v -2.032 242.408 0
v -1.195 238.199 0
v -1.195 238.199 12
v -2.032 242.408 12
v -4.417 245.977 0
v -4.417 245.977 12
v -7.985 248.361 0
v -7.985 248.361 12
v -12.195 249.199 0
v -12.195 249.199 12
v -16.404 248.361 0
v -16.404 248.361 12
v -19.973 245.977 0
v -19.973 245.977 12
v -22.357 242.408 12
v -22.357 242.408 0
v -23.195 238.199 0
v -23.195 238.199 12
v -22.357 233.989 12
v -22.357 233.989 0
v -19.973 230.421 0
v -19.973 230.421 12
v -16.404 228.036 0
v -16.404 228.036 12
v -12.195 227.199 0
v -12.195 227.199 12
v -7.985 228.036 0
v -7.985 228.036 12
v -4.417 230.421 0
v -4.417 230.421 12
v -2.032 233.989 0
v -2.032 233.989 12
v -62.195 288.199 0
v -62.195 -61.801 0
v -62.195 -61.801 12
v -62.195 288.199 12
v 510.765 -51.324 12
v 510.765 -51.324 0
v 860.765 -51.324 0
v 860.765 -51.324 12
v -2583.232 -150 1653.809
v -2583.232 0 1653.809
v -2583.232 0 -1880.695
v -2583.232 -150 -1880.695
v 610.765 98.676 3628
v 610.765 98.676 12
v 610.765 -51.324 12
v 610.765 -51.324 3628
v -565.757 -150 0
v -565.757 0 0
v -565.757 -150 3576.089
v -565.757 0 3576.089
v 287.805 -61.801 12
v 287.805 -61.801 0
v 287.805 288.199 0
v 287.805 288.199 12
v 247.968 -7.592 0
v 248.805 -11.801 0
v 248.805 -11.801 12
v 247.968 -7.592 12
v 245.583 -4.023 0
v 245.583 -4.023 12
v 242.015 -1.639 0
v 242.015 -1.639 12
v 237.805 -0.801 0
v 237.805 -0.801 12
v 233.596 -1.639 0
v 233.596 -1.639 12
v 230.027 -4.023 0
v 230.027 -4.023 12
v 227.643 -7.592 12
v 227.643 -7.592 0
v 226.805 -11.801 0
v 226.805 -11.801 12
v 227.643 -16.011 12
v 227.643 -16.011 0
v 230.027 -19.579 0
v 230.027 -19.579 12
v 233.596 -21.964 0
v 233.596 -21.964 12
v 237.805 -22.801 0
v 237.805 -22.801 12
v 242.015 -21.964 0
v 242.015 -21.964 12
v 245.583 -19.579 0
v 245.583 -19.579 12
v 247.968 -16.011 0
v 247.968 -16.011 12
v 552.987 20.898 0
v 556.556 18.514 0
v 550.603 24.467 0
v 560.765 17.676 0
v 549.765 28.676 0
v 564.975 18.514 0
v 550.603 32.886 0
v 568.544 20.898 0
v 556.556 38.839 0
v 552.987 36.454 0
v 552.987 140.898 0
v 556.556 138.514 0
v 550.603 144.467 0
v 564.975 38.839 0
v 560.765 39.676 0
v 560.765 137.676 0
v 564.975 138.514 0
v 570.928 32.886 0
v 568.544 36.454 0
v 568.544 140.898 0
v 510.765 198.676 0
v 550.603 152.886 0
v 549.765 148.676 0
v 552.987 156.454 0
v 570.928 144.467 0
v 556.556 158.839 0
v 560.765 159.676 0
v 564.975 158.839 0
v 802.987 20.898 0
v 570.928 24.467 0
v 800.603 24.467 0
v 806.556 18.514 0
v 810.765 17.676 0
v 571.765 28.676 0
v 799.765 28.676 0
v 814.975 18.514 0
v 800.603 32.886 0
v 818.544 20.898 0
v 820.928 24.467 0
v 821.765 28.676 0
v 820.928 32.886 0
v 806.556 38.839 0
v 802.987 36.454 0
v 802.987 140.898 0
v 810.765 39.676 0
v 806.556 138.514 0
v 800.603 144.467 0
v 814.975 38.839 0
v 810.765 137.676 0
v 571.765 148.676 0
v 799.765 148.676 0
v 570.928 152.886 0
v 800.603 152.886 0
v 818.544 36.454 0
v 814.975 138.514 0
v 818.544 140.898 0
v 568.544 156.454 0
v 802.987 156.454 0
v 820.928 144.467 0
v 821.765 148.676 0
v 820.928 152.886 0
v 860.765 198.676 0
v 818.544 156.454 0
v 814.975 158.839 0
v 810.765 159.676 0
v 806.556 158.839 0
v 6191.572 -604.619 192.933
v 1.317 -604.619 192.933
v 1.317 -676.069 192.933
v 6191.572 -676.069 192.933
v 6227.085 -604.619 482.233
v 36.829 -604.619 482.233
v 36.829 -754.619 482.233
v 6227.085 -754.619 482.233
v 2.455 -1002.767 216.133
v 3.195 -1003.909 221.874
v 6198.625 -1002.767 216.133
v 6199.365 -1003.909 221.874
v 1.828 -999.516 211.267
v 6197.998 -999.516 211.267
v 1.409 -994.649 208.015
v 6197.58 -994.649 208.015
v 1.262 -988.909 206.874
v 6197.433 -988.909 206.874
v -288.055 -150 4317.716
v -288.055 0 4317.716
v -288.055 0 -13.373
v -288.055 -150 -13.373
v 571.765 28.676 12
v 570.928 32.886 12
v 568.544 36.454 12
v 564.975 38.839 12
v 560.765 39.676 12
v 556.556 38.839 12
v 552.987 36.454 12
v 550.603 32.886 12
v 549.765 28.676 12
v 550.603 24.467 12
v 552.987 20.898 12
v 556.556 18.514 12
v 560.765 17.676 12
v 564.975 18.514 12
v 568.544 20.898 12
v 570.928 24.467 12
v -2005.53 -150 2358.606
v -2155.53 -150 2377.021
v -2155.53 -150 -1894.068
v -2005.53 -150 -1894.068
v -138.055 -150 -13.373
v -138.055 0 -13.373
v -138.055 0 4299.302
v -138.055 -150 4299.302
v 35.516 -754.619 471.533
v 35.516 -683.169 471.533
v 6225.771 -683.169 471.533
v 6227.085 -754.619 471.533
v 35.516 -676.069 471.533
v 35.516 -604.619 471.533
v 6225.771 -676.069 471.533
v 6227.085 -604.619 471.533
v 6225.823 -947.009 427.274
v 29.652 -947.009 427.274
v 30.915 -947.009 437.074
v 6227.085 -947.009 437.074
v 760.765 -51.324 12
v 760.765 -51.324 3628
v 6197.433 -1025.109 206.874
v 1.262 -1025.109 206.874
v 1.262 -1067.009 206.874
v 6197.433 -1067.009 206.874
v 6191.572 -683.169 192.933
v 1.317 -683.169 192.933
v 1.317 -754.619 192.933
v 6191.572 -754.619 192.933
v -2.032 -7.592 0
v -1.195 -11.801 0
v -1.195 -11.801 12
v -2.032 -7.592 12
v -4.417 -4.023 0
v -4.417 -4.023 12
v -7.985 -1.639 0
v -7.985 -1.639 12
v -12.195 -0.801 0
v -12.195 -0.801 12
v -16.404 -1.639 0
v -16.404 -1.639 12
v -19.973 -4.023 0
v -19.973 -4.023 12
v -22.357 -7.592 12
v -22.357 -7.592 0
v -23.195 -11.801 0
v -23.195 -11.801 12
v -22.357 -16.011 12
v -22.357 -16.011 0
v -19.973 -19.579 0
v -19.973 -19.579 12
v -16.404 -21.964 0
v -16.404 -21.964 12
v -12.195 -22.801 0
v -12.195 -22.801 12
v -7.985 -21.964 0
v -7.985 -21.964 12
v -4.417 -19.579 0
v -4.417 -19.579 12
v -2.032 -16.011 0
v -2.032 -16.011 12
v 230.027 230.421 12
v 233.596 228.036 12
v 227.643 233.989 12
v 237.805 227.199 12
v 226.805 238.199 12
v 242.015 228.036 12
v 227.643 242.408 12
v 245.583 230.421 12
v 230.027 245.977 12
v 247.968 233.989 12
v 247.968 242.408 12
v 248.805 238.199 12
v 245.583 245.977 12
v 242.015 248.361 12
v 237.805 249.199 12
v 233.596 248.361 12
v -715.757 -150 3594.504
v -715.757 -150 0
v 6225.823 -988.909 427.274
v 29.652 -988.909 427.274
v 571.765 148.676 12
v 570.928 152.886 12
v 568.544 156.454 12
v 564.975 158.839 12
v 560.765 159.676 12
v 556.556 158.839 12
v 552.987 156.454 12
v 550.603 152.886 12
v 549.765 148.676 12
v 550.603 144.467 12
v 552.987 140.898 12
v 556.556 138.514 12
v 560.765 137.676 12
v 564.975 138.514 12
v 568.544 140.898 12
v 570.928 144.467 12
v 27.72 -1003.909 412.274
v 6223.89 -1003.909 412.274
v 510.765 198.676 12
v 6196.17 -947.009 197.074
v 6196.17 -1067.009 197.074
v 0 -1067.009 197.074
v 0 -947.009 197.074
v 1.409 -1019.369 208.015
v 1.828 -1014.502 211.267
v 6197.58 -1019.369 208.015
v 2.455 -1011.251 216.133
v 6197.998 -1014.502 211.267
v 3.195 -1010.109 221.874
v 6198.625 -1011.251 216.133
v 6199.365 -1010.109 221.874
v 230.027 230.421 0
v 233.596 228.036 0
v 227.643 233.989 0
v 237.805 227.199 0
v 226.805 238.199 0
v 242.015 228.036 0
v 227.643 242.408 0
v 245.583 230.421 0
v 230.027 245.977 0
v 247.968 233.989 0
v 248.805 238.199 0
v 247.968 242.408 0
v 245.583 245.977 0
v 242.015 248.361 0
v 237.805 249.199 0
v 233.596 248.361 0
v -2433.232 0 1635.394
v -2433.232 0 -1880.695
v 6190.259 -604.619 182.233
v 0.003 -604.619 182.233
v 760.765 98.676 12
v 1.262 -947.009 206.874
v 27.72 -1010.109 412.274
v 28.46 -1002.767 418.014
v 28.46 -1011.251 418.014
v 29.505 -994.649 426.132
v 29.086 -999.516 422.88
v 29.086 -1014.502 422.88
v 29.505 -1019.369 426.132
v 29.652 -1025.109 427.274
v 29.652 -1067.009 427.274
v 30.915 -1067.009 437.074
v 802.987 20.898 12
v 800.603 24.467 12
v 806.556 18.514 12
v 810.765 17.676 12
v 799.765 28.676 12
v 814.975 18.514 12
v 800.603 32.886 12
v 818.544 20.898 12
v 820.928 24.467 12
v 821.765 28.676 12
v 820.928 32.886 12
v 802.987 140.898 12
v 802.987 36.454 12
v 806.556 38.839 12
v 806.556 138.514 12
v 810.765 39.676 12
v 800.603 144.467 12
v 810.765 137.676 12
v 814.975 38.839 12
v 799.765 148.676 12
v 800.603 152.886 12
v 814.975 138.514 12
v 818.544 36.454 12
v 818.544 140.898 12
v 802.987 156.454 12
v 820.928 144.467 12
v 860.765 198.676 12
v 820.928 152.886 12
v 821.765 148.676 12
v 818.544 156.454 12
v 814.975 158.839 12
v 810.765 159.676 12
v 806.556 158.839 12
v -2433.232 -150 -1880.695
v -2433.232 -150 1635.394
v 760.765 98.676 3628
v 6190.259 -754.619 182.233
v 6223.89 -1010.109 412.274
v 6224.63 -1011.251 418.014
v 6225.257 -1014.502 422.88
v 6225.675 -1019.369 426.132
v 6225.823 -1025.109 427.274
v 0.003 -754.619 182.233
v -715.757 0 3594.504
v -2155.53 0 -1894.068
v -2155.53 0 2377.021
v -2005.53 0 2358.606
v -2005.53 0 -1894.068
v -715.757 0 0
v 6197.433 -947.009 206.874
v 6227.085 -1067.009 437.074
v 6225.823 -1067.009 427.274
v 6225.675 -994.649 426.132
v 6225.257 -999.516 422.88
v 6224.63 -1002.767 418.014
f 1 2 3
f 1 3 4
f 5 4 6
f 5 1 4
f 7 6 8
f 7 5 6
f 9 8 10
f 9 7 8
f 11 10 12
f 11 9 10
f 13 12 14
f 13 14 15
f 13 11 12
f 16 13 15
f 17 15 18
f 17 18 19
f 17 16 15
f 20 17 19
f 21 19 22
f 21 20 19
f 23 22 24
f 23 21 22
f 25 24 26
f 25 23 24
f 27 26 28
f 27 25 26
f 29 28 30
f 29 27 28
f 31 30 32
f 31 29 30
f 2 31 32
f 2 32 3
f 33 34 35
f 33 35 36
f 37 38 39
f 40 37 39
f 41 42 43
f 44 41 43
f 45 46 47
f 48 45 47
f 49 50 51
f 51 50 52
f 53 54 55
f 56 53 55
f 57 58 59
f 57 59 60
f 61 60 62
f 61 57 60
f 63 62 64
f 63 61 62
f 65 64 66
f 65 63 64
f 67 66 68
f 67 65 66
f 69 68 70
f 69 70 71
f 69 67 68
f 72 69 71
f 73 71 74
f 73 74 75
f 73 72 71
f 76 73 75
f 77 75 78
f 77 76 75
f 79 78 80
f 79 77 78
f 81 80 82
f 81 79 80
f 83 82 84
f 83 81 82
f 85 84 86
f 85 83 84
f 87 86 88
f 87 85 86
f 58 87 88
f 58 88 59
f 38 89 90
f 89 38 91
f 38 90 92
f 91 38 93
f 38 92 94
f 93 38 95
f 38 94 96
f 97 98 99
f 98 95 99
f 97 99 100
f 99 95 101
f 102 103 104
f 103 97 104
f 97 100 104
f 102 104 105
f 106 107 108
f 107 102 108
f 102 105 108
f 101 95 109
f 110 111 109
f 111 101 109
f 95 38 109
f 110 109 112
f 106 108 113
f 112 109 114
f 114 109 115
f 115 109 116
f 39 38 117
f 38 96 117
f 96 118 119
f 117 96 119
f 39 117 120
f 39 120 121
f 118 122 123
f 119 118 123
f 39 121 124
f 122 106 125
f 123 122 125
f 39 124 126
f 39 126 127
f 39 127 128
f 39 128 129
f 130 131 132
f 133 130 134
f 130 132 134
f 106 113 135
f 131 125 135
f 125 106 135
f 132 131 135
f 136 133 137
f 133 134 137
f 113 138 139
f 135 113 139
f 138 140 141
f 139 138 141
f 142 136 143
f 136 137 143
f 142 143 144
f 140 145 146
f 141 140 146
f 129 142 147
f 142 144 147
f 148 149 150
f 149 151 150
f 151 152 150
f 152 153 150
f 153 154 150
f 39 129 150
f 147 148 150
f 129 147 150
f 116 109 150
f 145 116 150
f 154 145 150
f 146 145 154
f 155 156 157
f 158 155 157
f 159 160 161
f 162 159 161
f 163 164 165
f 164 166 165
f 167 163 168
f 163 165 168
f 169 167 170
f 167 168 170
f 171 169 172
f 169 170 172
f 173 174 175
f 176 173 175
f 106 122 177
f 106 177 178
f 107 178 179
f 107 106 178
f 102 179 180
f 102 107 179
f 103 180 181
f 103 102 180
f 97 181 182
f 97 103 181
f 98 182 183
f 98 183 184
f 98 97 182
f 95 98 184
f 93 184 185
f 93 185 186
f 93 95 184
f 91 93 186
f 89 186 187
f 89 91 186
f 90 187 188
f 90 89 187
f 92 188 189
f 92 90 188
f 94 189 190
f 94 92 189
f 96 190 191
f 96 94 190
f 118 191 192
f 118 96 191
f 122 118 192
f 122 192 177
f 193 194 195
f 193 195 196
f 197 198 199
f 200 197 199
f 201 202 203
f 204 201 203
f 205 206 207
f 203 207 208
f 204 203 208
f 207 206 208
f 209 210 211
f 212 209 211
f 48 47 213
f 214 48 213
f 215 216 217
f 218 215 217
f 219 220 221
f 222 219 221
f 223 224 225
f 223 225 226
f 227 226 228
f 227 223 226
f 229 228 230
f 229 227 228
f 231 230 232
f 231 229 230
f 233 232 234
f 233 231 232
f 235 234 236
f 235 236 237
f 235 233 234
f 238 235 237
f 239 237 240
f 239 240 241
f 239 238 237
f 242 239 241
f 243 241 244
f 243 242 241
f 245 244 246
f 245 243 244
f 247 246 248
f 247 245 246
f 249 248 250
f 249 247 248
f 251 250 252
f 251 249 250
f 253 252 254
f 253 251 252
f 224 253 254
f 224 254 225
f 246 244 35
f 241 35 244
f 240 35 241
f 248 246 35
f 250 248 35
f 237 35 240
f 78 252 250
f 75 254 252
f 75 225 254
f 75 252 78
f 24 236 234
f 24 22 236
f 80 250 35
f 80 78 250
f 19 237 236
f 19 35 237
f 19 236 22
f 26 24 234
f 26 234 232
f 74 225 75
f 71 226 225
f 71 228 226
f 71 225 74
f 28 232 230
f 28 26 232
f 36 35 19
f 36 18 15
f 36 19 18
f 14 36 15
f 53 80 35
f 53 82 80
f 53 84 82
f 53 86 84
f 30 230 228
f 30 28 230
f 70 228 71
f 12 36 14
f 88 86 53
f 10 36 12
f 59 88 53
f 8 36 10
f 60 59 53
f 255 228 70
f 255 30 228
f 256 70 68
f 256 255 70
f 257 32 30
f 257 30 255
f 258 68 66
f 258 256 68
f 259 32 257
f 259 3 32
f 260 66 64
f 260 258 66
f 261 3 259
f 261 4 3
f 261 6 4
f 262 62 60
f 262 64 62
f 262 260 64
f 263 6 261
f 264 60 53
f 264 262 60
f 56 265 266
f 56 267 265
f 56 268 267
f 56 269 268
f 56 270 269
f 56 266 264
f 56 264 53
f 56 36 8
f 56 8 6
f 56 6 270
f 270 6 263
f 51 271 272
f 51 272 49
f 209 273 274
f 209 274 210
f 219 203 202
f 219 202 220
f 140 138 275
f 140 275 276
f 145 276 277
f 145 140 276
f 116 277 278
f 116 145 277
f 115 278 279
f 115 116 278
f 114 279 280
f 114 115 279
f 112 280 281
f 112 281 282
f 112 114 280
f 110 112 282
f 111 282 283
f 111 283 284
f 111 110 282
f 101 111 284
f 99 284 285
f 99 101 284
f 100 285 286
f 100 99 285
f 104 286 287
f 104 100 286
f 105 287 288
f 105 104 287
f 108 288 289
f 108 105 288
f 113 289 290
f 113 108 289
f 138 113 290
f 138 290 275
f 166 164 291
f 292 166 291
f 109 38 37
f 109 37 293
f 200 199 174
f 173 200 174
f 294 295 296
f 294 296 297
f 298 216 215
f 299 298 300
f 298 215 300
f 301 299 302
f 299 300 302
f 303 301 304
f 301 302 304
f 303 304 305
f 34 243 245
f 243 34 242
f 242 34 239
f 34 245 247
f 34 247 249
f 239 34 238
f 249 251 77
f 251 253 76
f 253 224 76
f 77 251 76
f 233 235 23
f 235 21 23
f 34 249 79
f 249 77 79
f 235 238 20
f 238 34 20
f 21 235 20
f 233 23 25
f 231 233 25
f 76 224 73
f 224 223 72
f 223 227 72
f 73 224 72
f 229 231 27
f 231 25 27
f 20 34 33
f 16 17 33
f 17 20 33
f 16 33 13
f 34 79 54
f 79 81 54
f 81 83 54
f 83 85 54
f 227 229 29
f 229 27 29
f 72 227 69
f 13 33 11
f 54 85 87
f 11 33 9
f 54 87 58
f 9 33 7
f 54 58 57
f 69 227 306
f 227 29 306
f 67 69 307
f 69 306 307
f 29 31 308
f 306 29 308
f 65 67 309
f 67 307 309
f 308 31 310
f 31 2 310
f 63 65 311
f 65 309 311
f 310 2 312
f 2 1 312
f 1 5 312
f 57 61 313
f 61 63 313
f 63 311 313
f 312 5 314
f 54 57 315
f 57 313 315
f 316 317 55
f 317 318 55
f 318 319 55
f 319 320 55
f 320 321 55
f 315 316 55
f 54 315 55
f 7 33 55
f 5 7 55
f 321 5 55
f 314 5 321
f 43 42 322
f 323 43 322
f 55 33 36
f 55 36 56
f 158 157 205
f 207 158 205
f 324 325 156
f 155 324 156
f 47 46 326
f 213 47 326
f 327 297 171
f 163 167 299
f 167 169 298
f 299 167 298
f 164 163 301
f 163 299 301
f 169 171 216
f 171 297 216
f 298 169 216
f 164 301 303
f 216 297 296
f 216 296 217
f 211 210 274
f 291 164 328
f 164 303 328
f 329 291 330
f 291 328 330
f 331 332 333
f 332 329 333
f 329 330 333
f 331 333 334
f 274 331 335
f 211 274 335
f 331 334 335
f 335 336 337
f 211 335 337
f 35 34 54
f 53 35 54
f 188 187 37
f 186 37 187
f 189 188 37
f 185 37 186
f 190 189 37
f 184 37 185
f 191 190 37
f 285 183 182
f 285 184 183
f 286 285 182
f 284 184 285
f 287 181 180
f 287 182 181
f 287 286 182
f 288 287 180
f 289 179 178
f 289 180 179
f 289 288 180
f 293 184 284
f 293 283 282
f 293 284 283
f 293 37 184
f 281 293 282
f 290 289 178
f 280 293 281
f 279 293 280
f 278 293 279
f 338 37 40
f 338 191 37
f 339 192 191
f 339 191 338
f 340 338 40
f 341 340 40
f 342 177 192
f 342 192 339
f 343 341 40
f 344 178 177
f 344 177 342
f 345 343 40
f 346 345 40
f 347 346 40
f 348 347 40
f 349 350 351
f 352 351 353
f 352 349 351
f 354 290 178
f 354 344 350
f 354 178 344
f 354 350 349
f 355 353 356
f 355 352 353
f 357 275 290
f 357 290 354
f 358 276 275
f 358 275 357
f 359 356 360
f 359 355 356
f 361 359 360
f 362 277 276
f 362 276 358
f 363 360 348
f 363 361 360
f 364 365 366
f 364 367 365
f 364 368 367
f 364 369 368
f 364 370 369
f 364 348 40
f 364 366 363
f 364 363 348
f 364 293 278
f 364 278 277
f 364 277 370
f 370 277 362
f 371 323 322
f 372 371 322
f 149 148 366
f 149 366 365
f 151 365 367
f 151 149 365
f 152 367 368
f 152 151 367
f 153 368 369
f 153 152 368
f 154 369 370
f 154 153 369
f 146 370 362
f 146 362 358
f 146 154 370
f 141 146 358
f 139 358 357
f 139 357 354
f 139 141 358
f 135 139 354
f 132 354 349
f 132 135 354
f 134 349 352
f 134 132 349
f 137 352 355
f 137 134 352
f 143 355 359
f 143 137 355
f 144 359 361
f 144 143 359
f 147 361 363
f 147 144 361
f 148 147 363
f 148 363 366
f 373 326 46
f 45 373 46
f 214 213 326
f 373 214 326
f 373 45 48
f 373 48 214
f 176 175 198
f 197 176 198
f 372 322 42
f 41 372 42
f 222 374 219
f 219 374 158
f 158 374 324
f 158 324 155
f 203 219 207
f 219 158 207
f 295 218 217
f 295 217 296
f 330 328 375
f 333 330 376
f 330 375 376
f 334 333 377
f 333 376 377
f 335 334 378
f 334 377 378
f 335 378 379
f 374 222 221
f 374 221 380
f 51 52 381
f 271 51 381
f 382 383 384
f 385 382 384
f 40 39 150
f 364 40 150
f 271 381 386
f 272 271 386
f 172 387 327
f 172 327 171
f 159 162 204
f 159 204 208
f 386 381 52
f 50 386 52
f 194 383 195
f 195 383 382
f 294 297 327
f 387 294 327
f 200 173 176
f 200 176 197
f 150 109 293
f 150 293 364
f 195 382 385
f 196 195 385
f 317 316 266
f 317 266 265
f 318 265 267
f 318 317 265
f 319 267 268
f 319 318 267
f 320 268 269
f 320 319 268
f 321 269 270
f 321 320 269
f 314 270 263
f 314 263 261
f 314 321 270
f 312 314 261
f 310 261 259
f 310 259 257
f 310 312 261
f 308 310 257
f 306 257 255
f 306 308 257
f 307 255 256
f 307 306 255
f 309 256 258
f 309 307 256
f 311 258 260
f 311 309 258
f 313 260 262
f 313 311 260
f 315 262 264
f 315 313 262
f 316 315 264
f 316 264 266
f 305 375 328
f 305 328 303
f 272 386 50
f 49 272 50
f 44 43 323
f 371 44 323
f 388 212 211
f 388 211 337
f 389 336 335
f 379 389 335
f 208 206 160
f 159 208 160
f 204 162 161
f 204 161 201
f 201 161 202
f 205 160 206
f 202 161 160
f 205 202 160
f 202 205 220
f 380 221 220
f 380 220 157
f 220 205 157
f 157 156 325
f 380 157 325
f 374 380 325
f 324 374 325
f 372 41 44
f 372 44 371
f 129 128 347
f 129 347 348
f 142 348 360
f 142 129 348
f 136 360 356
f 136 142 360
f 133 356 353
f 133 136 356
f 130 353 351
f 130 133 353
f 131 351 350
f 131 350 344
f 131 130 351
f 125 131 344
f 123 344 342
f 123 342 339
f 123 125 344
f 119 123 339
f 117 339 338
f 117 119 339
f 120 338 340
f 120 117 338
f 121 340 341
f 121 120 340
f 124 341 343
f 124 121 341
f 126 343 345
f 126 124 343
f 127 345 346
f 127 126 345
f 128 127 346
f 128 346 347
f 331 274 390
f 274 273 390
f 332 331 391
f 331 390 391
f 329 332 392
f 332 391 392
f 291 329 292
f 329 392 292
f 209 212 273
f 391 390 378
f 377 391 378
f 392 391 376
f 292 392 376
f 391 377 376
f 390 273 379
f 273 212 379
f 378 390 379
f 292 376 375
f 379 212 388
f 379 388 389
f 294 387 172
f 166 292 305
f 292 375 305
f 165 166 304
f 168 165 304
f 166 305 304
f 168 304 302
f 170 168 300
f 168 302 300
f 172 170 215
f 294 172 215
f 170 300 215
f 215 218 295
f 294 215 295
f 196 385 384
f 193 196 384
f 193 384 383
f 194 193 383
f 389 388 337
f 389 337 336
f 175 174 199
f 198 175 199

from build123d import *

# Parameters (mm, degrees)
F0_W      = 350
F0_H      = 350
F0_R      = 11
F0_H_2    = 250
F1_DEPTH  = 12
F3_DEPTH  = 150
F5_DEPTH  = 6227.0849
F7_DEPTH  = 120
F8_R      = 15
F10_DEPTH = 3616
F12_DEPTH = 150


with BuildPart() as f1:
    # F0 (on Top) → F1 (new body)
    with BuildSketch(Plane.XY):
        with Locations((112.805232, 113.198779)):
            Rectangle(F0_W, F0_H)
        with Locations((-12.194768, -11.801221)):
            Circle(F0_R, mode=Mode.SUBTRACT)
        with Locations((237.805232, -11.801221)):
            Circle(F0_R, mode=Mode.SUBTRACT)
        with Locations((-12.194768, 238.198779)):
            Circle(F0_R, mode=Mode.SUBTRACT)
        with Locations((237.805232, 238.198779)):
            Circle(F0_R, mode=Mode.SUBTRACT)
        with Locations((685.765374, 73.676325)):
            Rectangle(F0_W, F0_H_2)
        with Locations((560.765374, 28.676325)):
            Circle(F0_R, mode=Mode.SUBTRACT)
        with Locations((810.765374, 28.676325)):
            Circle(F0_R, mode=Mode.SUBTRACT)
        with Locations((560.765374, 148.676325)):
            Circle(F0_R, mode=Mode.SUBTRACT)
        with Locations((810.765374, 148.676325)):
            Circle(F0_R, mode=Mode.SUBTRACT)
    extrude(amount=F1_DEPTH)


with BuildPart() as f3:
    # F2 (on Front) → F3 (new body)
    with BuildSketch(Plane.XZ):
        Polygon((-715.75731, 3594.5041), (-715.75731, 0), (-565.75731, 0), (-565.75731, 3576.0894), align=None)
        Polygon((-288.05539, 4317.716167), (-288.05539, -13.373233), (-138.05539, -13.373233), (-138.05539, 4299.301567), align=None)
        Polygon((-2155.529943, 2377.021056), (-2155.529943, -1894.068344), (-2005.529943, -1894.068344), (-2005.529943, 2358.606456), align=None)
        Polygon((-2583.231863, 1653.808989), (-2583.231863, -1880.695111), (-2433.231863, -1880.695111), (-2433.231863, 1635.394289), align=None)
    extrude(amount=F3_DEPTH)


with BuildPart() as f5:
    # F4 (on Right) → F5 (new body)
    with BuildSketch(Plane.YZ):
        Polygon((-1067.008972, 206.873594), (-1067.008972, 197.073594), (-947.008972, 197.073594), (-947.008972, 206.873594), (-1003.908972, 206.873594), (-1003.908972, 211.873594), (-1003.908972, 427.273594), (-947.008972, 427.273594), (-947.008972, 437.073594), (-1067.008972, 437.073594), (-1067.008972, 427.273594), (-1010.108972, 427.273594), (-1010.108972, 211.873594), (-1010.108972, 206.873594), align=None)
        Polygon((-754.619122, 192.933125), (-754.619122, 182.233125), (-604.619122, 182.233125), (-604.619122, 192.933125), (-676.069122, 192.933125), (-676.069122, 471.533125), (-604.619122, 471.533125), (-604.619122, 482.233125), (-754.619122, 482.233125), (-754.619122, 471.533125), (-683.169122, 471.533125), (-683.169122, 192.933125), align=None)
    extrude(amount=F5_DEPTH)

    # F6 (on face) → F7 (cut)
    with BuildSketch(Plane.XZ.offset(1067.008972)):
        Polygon((0, 437.073594), (0, 197.073594), (30.9147, 437.073594), align=None)
        Polygon((6196.1702, 197.073594), (6227.0849, 197.073594), (6227.0849, 437.073594), align=None)
    extrude(amount=-F7_DEPTH, mode=Mode.SUBTRACT)

    # F8
    f8_edges = [f5.edges().sort_by_distance(p)[0] for p in [
        (3099.34745, -1010.108972, 206.873594),
        (3127.73745, -1010.108972, 427.273594),
        (3099.34745, -1003.908972, 206.873594),
        (3127.73745, -1003.908972, 427.273594),
    ]]
    fillet(f8_edges, radius=F8_R)

    # F11 (on face) → F12 (cut)
    with BuildSketch(Plane(origin=(0, -604.619122, 0), x_dir=(-1, 0, 0), z_dir=(0, 1, 0))):
        Polygon((-6190.2556, 182.208225), (-6225.771431, 471.533125), (-6227.0849, 471.533125), (-6227.0849, 182.208225), align=None)
        Polygon((-35.515831, 471.533125), (0, 182.208225), (0, 471.533125), align=None)
        Polygon((-35.515831, 471.533125), (0, 471.533125), (0, 482.233125), (-36.8293, 482.233125), align=None)
    extrude(amount=-F12_DEPTH, mode=Mode.SUBTRACT)


with BuildPart() as f10:
    # F9 (on face) → F10 (new body)
    with BuildSketch(Plane.XY.offset(12)):
        Polygon((760.765374, 98.676325), (685.765374, 98.676325), (610.765374, 98.676325), (610.765374, -51.323675), (760.765374, -51.323675), align=None)
    extrude(amount=F10_DEPTH)


solid = Compound([f1.part, f3.part, f5.part, f10.part])
